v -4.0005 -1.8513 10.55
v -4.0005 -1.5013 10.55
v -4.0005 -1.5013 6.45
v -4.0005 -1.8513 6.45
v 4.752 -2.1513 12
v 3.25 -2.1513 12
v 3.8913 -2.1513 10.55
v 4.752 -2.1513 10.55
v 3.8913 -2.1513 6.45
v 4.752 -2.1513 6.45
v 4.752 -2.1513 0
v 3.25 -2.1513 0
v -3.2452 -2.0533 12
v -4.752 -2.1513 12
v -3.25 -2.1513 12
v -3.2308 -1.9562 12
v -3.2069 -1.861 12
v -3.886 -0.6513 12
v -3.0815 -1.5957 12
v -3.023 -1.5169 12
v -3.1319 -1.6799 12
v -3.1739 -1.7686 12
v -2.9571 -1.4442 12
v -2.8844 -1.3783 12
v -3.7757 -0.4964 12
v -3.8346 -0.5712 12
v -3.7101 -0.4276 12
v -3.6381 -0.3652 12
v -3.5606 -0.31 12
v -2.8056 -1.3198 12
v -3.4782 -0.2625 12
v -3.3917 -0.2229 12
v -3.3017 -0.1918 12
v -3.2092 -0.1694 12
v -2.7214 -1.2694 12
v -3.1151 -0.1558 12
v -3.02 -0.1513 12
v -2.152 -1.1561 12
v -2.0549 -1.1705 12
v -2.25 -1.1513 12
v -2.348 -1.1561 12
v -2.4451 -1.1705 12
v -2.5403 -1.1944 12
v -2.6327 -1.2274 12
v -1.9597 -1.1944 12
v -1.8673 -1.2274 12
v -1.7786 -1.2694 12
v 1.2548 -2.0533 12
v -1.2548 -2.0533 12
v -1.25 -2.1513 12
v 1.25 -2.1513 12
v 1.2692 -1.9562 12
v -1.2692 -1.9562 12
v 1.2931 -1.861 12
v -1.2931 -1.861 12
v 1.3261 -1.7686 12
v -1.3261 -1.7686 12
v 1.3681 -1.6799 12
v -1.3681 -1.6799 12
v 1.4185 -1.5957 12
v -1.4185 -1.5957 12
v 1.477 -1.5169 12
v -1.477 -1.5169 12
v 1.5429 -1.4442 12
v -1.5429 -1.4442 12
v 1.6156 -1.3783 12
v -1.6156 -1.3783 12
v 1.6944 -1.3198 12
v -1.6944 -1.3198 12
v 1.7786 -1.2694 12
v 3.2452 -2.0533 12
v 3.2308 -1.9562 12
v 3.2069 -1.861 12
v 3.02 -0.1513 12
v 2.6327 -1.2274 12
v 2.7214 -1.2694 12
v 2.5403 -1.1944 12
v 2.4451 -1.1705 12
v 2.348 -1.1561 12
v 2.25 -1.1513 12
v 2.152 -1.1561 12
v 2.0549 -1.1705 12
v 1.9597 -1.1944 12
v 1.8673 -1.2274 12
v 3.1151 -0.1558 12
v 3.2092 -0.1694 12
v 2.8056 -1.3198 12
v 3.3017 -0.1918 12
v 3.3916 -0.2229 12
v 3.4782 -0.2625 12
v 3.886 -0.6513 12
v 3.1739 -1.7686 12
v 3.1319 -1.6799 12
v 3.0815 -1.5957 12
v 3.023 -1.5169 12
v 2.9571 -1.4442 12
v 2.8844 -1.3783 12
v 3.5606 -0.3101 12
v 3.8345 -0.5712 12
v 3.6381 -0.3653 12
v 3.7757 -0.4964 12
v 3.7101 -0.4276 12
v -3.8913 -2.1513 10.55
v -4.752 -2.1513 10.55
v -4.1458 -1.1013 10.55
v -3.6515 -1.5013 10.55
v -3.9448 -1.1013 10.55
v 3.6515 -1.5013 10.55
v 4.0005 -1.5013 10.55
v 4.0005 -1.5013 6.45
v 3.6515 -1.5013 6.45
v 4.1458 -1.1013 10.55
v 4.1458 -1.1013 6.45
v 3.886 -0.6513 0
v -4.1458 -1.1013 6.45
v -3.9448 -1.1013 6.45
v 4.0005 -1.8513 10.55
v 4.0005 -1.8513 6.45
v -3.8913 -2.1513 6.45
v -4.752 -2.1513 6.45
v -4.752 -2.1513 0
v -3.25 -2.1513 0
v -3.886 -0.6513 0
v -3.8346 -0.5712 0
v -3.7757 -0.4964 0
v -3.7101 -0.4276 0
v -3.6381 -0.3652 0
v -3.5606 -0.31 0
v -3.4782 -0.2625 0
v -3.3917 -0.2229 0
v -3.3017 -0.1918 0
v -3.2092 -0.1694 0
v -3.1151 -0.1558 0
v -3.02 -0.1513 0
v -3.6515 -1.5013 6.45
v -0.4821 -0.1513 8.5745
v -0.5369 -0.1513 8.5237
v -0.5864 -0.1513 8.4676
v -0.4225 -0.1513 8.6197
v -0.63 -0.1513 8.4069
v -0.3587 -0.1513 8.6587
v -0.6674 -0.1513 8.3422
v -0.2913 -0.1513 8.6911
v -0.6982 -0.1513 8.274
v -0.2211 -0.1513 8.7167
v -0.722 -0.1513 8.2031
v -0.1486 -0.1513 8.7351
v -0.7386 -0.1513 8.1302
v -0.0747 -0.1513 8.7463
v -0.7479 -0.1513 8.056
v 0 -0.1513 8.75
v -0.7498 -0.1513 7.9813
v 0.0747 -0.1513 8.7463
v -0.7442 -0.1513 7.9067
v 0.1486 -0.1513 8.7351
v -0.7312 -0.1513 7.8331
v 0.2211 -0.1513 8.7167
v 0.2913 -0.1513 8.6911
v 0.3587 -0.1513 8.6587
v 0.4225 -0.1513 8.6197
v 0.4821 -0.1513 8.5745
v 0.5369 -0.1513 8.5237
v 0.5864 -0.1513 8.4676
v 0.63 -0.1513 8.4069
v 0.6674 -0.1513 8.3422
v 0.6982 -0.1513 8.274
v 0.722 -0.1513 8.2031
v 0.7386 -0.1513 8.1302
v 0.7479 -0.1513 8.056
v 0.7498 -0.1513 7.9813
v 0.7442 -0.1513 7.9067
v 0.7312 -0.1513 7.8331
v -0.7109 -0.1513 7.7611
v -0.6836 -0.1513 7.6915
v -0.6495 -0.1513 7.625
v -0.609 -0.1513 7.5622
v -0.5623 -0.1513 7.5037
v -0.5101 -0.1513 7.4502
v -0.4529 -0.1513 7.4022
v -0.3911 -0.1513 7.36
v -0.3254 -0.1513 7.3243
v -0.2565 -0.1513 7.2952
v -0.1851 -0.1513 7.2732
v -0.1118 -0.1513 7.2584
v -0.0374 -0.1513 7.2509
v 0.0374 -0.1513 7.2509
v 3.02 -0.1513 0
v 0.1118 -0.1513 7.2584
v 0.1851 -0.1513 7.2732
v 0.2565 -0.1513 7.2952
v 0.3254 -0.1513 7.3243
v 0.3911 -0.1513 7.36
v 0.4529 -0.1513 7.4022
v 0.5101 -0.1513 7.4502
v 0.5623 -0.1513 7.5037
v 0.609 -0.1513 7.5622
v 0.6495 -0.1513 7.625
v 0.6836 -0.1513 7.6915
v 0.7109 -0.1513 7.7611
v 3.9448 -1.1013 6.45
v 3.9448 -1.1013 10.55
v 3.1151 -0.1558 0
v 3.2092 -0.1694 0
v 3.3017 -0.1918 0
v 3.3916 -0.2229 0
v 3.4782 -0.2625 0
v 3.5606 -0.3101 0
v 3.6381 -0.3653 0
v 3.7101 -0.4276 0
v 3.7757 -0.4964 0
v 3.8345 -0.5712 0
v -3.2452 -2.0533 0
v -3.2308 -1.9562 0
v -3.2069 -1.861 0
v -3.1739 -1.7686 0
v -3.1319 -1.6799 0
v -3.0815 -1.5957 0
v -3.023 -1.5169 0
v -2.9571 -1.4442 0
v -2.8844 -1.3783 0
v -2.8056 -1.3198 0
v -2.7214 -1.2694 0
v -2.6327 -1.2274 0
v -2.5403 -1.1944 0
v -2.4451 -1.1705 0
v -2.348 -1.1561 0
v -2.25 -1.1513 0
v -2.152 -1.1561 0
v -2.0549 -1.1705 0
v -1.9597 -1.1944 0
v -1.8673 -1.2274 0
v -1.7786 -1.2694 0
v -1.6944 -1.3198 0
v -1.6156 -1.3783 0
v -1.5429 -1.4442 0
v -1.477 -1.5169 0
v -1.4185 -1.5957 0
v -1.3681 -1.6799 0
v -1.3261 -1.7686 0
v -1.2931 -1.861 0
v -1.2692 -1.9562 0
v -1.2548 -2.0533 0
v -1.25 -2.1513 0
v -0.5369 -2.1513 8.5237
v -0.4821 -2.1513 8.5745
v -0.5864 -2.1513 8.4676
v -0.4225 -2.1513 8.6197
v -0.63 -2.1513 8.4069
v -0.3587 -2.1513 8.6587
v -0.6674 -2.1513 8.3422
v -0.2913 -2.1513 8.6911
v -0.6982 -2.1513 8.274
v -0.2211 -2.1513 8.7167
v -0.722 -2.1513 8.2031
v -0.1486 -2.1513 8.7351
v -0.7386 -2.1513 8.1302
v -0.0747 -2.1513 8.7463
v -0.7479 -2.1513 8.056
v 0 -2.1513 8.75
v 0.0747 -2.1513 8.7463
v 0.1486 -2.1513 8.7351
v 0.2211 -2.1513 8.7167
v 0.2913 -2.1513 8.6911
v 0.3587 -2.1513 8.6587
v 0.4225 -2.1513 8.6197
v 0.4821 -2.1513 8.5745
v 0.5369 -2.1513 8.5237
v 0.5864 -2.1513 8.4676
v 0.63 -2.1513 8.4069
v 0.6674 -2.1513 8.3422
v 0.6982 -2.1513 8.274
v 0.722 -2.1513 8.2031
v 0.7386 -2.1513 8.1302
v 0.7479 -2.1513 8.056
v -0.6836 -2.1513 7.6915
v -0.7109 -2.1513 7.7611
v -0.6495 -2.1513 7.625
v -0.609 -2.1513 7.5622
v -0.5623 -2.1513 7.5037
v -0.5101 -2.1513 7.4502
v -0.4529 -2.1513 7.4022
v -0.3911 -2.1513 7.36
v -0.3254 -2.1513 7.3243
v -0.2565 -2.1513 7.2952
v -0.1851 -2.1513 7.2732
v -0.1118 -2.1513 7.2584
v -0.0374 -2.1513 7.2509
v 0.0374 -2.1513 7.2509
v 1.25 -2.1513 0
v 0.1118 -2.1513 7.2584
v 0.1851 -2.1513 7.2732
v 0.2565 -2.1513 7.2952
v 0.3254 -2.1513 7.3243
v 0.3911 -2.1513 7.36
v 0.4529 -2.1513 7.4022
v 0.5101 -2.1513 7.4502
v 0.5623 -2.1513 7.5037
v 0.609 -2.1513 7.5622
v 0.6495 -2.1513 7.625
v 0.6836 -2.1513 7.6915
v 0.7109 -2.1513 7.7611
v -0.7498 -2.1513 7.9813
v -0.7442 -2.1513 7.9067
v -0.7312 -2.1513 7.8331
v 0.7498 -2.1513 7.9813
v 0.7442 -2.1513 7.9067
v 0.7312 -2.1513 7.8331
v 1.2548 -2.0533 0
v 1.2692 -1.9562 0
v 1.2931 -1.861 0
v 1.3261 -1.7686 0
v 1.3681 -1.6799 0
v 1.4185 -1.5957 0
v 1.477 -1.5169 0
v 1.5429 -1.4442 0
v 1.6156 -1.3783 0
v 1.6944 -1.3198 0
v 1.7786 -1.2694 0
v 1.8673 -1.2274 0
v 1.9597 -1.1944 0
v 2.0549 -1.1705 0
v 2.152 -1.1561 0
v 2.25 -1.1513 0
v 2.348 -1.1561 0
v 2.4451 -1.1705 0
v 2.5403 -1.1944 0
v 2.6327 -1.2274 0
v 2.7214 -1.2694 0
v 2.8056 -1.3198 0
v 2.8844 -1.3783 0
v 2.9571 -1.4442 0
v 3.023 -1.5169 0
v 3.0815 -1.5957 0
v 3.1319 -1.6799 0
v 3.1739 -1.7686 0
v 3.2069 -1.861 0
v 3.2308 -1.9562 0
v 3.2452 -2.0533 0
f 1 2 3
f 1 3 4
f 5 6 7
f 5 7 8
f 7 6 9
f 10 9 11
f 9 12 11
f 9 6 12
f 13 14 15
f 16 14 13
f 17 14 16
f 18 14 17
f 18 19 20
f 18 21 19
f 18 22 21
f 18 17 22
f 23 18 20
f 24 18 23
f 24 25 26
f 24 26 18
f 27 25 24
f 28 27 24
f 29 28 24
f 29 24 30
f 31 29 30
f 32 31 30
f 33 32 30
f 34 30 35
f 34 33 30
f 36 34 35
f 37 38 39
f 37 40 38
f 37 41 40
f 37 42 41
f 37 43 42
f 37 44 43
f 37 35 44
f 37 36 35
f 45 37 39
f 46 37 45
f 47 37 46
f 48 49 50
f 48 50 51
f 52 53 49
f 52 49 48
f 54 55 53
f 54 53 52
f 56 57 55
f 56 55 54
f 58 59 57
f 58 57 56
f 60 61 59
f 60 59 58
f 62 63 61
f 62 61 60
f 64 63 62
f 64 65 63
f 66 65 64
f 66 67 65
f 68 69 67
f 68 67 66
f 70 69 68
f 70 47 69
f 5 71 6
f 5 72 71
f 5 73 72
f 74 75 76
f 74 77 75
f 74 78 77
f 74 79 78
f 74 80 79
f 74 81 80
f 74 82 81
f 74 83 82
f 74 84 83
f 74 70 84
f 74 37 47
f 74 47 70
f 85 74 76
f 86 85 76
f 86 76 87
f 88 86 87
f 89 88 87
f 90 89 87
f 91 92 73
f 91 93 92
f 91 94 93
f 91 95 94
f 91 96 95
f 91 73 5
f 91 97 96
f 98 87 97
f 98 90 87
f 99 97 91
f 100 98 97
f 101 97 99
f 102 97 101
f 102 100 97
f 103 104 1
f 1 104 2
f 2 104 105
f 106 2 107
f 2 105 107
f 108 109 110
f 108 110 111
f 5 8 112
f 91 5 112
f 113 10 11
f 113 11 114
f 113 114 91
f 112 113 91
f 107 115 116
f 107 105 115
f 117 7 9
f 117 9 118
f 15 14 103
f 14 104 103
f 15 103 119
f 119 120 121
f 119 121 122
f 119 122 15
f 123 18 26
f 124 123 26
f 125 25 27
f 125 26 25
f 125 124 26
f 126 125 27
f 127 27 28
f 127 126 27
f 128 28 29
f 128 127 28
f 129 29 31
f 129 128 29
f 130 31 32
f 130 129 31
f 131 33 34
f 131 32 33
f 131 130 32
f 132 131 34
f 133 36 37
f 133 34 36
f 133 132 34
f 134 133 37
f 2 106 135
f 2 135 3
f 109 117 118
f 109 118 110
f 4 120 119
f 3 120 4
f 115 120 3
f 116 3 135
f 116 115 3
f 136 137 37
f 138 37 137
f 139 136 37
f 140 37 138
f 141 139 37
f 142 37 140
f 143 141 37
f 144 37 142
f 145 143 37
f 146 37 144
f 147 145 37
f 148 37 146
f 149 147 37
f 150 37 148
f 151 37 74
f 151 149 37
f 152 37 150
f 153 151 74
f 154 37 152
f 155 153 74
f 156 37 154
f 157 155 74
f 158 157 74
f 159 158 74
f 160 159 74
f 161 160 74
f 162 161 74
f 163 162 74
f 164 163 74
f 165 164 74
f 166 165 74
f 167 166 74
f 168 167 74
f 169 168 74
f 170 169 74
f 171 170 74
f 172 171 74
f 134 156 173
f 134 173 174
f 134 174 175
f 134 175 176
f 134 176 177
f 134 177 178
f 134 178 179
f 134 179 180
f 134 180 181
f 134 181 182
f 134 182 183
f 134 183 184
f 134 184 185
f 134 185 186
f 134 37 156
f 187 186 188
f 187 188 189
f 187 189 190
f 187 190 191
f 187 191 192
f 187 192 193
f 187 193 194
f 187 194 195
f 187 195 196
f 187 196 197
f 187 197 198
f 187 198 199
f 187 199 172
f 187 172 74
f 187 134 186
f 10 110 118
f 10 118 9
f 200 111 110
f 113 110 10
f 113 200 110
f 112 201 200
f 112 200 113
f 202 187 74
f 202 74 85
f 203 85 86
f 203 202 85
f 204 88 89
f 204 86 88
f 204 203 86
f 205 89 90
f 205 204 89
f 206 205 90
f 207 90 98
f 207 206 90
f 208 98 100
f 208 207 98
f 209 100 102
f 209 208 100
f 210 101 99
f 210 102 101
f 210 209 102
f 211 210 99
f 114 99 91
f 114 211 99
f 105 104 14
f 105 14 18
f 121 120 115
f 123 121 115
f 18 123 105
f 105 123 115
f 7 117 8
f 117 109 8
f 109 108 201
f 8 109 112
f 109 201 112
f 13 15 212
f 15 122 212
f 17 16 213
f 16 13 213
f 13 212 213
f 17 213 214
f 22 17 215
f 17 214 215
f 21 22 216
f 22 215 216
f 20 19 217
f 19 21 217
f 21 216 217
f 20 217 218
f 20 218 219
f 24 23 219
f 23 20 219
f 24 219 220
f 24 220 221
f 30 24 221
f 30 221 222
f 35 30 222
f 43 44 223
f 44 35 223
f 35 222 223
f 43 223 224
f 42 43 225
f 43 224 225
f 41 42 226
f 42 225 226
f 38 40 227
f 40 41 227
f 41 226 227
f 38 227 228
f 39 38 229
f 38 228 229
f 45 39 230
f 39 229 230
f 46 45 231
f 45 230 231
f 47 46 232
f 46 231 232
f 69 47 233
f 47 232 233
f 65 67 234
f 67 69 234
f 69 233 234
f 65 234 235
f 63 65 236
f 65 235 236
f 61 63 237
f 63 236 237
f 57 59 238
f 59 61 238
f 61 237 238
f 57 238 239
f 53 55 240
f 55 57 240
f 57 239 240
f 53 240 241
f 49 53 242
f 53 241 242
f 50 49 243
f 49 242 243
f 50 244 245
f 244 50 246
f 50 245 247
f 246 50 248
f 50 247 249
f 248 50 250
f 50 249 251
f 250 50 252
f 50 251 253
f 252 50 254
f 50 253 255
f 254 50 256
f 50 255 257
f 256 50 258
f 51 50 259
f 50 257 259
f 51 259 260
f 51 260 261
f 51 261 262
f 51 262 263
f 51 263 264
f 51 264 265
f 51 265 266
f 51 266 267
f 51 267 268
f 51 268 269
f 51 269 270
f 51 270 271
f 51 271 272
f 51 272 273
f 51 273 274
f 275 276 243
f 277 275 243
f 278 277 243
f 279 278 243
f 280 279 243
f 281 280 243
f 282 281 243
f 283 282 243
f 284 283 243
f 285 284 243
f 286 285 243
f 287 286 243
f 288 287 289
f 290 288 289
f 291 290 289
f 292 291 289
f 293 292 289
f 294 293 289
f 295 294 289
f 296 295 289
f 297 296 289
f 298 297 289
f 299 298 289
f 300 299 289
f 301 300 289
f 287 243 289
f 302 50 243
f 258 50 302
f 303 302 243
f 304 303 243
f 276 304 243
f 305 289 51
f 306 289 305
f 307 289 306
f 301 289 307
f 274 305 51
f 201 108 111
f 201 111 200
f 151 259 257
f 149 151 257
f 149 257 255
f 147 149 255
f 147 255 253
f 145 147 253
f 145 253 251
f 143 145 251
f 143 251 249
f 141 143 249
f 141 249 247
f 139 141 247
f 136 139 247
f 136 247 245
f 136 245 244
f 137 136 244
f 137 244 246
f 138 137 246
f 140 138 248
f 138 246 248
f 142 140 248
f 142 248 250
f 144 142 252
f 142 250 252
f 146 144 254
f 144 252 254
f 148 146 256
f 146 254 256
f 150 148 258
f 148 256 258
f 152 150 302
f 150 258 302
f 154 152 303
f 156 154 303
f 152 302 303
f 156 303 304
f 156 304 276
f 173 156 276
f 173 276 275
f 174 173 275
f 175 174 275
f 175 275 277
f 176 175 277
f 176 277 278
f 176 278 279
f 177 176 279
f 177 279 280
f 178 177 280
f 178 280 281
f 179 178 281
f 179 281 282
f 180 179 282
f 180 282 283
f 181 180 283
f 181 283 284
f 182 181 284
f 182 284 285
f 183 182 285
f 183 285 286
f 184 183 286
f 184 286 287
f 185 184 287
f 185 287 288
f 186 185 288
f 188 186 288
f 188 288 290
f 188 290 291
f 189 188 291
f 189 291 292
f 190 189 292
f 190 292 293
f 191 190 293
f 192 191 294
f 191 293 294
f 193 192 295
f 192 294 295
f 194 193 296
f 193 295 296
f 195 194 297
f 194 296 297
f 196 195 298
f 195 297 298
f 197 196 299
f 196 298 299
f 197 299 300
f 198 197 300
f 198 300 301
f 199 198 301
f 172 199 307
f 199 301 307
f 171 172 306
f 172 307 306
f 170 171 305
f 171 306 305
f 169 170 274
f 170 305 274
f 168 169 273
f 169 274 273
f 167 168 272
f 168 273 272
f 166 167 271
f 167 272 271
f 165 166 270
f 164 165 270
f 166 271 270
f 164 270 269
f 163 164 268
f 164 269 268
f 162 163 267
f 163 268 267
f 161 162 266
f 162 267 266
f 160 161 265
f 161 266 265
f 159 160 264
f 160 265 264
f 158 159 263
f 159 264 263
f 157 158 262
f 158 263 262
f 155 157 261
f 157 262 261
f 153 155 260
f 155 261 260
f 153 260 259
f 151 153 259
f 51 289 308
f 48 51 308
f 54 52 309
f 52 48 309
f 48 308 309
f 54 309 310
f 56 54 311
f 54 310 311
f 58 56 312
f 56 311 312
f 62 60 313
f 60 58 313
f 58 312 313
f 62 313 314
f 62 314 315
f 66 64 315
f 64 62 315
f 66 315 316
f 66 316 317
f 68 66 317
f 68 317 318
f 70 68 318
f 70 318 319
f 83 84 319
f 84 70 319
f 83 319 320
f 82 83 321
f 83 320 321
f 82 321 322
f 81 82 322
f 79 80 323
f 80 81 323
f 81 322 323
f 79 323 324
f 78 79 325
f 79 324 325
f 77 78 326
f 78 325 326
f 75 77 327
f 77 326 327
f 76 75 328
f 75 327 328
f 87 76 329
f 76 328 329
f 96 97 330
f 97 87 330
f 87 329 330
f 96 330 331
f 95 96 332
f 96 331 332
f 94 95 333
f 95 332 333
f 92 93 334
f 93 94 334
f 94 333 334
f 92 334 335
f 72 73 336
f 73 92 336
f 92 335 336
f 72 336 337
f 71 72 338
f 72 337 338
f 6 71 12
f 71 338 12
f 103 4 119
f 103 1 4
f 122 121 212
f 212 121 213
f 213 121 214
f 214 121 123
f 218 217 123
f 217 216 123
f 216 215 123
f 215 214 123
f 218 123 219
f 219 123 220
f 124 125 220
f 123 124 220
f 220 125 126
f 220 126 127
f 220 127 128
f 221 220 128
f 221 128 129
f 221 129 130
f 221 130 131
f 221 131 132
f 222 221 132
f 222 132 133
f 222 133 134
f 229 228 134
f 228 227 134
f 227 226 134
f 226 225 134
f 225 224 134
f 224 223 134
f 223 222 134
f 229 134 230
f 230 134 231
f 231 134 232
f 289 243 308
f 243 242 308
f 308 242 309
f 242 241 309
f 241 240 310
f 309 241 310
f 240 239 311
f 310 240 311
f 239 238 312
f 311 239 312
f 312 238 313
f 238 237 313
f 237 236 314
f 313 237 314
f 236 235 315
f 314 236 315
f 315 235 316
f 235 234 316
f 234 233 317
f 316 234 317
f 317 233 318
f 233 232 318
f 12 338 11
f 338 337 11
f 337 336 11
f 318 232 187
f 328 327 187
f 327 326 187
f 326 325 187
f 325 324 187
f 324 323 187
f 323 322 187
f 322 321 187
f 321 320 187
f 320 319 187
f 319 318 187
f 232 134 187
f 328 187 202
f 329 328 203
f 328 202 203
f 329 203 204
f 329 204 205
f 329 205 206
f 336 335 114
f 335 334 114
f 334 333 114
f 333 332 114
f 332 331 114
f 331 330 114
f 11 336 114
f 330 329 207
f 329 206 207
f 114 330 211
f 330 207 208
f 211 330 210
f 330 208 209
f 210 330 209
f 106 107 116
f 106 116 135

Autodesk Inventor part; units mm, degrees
ref_plane "YZ Plane" through (0, 0, 0) normal (1, 0, 0) x (0, 1, 0)
ref_plane "XZ Plane" through (0, 0, 0) normal (0, 1, 0) x (-1, 0, 0)
sketch "Sketch1" plane through (0, 0, 0) normal (0, 0, 1) x (1, 0, 0)
  line L0 (-4.752, -2.1513) -> (-3.25, -2.1513)
  arc A0 (-1.25, -2.1513) -> (-3.25, -2.1513) centre (-2.25, -2.1513) ccw
  line L1 (-3.25, -2.1513) -> (1.2966, -2.1513) construction
  line L2 (-1.25, -2.1513) -> (1.25, -2.1513)
  arc A1 (3.25, -2.1513) -> (1.25, -2.1513) centre (2.25, -2.1513) ccw
  line L3 (1.25, -2.1513) -> (6.8796, -2.1513) construction
  line L4 (3.25, -2.1513) -> (4.752, -2.1513)
  line L5 (-4.752, -2.1513) -> (-3.886, -0.6513)
  line L6 (-4.752, -2.1513) -> (-3.02, -2.1513) construction
  arc A2 (-3.02, -0.1513) -> (-3.886, -0.6513) centre (-3.02, -1.1513) ccw
  line L7 (-3.886, -0.6513) -> (-3.02, -0.1513) construction
  line L8 (-3.02, -0.1513) -> (3.02, -0.1513)
  line L9 (4.752, -2.1513) -> (3.886, -0.6513)
  line L10 (4.752, -2.1513) -> (6.484, -2.1513) construction
  arc A3 (3.886, -0.6513) -> (3.02, -0.1513) centre (3.02, -1.1513) ccw
  line L11 (0, 0) -> (0, 1.588) construction
  dimension "d1" = 2
  dimension "d2" = 2.5
  dimension "d3" = 2
  dimension "d5" = 60
  dimension "d6" = 1.732
  dimension "d7" = 1
  dimension "d8" = 1
  dimension "d9" = 6.04
  dimension "d10" = 1.732
  dimension "d11" = 120
  dimension "d12" = 1
  dimension "d34" = 9.504
  dimension "d35" = 1.502
  dimension "d36" = 1.502
extrude "Extrusion1" add sketch "Sketch1" along normal blind 12
sketch "Sketch2" plane through (-3.02, -0.1513, 0) normal (0, 1, 0) x (1, 0, 0)
  line L0 (6.04, -12) -> (0, -12) projected
  line L1 (7.772, 0) -> (7.772, -12) projected
  point P0 (3.02, 0)
  point P1 (3.02, -8)
  dimension "d22" = 4
  dimension "d23" = 4.752
hole "Hole1" at (0, -0.1513, 8) direction (0, -1, 0) diameter 1.5 depth 8 tip angle 118
ref_plane "Work Plane1" through (0, 0, 10.55) normal (0, 0, 1) x (1, 0, 0)
sketch "Sketch3" plane through (0, 0, 10.55) normal (0, 0, 1) x (1, 0, 0)
  line L0 (-4.1458, -1.1013) -> (-3.9448, -1.1013)
  line L1 (-4.752, -2.1513) -> (-3.25, -2.1513) projected
  line L2 (-3.886, -0.6513) -> (-4.752, -2.1513) projected
  line L3 (-3.9448, -1.1013) -> (-3.6515, -1.5013)
  line L4 (-3.6515, -1.5013) -> (-4.0005, -1.5013)
  line L5 (-4.0005, -1.5013) -> (-4.0005, -1.8513)
  line L6 (-4.0005, -1.8513) -> (-3.8913, -2.1513)
  line L7 (-4.1458, -1.1013) -> (-4.752, -2.1513)
  line L8 (-4.752, -2.1513) -> (-3.8913, -2.1513)
  point P0 (0, 0)
  dimension "d25" = 1.05
  dimension "d26" = 0.201
  dimension "d27" = 126.25
  dimension "d28" = 0.496
  dimension "d29" = 0.349
  dimension "d30" = 0.35
  dimension "d31" = 160
extrude "Extrusion2" cut sketch "Sketch3" against normal blind 4.1
mirror "Mirror1" about plane through (0, 0, 0) normal (1, 0, 0) of "Extrusion2"
properties part number "3d_LM - Pinza 1" material "PA12 SLS 3D Print"
